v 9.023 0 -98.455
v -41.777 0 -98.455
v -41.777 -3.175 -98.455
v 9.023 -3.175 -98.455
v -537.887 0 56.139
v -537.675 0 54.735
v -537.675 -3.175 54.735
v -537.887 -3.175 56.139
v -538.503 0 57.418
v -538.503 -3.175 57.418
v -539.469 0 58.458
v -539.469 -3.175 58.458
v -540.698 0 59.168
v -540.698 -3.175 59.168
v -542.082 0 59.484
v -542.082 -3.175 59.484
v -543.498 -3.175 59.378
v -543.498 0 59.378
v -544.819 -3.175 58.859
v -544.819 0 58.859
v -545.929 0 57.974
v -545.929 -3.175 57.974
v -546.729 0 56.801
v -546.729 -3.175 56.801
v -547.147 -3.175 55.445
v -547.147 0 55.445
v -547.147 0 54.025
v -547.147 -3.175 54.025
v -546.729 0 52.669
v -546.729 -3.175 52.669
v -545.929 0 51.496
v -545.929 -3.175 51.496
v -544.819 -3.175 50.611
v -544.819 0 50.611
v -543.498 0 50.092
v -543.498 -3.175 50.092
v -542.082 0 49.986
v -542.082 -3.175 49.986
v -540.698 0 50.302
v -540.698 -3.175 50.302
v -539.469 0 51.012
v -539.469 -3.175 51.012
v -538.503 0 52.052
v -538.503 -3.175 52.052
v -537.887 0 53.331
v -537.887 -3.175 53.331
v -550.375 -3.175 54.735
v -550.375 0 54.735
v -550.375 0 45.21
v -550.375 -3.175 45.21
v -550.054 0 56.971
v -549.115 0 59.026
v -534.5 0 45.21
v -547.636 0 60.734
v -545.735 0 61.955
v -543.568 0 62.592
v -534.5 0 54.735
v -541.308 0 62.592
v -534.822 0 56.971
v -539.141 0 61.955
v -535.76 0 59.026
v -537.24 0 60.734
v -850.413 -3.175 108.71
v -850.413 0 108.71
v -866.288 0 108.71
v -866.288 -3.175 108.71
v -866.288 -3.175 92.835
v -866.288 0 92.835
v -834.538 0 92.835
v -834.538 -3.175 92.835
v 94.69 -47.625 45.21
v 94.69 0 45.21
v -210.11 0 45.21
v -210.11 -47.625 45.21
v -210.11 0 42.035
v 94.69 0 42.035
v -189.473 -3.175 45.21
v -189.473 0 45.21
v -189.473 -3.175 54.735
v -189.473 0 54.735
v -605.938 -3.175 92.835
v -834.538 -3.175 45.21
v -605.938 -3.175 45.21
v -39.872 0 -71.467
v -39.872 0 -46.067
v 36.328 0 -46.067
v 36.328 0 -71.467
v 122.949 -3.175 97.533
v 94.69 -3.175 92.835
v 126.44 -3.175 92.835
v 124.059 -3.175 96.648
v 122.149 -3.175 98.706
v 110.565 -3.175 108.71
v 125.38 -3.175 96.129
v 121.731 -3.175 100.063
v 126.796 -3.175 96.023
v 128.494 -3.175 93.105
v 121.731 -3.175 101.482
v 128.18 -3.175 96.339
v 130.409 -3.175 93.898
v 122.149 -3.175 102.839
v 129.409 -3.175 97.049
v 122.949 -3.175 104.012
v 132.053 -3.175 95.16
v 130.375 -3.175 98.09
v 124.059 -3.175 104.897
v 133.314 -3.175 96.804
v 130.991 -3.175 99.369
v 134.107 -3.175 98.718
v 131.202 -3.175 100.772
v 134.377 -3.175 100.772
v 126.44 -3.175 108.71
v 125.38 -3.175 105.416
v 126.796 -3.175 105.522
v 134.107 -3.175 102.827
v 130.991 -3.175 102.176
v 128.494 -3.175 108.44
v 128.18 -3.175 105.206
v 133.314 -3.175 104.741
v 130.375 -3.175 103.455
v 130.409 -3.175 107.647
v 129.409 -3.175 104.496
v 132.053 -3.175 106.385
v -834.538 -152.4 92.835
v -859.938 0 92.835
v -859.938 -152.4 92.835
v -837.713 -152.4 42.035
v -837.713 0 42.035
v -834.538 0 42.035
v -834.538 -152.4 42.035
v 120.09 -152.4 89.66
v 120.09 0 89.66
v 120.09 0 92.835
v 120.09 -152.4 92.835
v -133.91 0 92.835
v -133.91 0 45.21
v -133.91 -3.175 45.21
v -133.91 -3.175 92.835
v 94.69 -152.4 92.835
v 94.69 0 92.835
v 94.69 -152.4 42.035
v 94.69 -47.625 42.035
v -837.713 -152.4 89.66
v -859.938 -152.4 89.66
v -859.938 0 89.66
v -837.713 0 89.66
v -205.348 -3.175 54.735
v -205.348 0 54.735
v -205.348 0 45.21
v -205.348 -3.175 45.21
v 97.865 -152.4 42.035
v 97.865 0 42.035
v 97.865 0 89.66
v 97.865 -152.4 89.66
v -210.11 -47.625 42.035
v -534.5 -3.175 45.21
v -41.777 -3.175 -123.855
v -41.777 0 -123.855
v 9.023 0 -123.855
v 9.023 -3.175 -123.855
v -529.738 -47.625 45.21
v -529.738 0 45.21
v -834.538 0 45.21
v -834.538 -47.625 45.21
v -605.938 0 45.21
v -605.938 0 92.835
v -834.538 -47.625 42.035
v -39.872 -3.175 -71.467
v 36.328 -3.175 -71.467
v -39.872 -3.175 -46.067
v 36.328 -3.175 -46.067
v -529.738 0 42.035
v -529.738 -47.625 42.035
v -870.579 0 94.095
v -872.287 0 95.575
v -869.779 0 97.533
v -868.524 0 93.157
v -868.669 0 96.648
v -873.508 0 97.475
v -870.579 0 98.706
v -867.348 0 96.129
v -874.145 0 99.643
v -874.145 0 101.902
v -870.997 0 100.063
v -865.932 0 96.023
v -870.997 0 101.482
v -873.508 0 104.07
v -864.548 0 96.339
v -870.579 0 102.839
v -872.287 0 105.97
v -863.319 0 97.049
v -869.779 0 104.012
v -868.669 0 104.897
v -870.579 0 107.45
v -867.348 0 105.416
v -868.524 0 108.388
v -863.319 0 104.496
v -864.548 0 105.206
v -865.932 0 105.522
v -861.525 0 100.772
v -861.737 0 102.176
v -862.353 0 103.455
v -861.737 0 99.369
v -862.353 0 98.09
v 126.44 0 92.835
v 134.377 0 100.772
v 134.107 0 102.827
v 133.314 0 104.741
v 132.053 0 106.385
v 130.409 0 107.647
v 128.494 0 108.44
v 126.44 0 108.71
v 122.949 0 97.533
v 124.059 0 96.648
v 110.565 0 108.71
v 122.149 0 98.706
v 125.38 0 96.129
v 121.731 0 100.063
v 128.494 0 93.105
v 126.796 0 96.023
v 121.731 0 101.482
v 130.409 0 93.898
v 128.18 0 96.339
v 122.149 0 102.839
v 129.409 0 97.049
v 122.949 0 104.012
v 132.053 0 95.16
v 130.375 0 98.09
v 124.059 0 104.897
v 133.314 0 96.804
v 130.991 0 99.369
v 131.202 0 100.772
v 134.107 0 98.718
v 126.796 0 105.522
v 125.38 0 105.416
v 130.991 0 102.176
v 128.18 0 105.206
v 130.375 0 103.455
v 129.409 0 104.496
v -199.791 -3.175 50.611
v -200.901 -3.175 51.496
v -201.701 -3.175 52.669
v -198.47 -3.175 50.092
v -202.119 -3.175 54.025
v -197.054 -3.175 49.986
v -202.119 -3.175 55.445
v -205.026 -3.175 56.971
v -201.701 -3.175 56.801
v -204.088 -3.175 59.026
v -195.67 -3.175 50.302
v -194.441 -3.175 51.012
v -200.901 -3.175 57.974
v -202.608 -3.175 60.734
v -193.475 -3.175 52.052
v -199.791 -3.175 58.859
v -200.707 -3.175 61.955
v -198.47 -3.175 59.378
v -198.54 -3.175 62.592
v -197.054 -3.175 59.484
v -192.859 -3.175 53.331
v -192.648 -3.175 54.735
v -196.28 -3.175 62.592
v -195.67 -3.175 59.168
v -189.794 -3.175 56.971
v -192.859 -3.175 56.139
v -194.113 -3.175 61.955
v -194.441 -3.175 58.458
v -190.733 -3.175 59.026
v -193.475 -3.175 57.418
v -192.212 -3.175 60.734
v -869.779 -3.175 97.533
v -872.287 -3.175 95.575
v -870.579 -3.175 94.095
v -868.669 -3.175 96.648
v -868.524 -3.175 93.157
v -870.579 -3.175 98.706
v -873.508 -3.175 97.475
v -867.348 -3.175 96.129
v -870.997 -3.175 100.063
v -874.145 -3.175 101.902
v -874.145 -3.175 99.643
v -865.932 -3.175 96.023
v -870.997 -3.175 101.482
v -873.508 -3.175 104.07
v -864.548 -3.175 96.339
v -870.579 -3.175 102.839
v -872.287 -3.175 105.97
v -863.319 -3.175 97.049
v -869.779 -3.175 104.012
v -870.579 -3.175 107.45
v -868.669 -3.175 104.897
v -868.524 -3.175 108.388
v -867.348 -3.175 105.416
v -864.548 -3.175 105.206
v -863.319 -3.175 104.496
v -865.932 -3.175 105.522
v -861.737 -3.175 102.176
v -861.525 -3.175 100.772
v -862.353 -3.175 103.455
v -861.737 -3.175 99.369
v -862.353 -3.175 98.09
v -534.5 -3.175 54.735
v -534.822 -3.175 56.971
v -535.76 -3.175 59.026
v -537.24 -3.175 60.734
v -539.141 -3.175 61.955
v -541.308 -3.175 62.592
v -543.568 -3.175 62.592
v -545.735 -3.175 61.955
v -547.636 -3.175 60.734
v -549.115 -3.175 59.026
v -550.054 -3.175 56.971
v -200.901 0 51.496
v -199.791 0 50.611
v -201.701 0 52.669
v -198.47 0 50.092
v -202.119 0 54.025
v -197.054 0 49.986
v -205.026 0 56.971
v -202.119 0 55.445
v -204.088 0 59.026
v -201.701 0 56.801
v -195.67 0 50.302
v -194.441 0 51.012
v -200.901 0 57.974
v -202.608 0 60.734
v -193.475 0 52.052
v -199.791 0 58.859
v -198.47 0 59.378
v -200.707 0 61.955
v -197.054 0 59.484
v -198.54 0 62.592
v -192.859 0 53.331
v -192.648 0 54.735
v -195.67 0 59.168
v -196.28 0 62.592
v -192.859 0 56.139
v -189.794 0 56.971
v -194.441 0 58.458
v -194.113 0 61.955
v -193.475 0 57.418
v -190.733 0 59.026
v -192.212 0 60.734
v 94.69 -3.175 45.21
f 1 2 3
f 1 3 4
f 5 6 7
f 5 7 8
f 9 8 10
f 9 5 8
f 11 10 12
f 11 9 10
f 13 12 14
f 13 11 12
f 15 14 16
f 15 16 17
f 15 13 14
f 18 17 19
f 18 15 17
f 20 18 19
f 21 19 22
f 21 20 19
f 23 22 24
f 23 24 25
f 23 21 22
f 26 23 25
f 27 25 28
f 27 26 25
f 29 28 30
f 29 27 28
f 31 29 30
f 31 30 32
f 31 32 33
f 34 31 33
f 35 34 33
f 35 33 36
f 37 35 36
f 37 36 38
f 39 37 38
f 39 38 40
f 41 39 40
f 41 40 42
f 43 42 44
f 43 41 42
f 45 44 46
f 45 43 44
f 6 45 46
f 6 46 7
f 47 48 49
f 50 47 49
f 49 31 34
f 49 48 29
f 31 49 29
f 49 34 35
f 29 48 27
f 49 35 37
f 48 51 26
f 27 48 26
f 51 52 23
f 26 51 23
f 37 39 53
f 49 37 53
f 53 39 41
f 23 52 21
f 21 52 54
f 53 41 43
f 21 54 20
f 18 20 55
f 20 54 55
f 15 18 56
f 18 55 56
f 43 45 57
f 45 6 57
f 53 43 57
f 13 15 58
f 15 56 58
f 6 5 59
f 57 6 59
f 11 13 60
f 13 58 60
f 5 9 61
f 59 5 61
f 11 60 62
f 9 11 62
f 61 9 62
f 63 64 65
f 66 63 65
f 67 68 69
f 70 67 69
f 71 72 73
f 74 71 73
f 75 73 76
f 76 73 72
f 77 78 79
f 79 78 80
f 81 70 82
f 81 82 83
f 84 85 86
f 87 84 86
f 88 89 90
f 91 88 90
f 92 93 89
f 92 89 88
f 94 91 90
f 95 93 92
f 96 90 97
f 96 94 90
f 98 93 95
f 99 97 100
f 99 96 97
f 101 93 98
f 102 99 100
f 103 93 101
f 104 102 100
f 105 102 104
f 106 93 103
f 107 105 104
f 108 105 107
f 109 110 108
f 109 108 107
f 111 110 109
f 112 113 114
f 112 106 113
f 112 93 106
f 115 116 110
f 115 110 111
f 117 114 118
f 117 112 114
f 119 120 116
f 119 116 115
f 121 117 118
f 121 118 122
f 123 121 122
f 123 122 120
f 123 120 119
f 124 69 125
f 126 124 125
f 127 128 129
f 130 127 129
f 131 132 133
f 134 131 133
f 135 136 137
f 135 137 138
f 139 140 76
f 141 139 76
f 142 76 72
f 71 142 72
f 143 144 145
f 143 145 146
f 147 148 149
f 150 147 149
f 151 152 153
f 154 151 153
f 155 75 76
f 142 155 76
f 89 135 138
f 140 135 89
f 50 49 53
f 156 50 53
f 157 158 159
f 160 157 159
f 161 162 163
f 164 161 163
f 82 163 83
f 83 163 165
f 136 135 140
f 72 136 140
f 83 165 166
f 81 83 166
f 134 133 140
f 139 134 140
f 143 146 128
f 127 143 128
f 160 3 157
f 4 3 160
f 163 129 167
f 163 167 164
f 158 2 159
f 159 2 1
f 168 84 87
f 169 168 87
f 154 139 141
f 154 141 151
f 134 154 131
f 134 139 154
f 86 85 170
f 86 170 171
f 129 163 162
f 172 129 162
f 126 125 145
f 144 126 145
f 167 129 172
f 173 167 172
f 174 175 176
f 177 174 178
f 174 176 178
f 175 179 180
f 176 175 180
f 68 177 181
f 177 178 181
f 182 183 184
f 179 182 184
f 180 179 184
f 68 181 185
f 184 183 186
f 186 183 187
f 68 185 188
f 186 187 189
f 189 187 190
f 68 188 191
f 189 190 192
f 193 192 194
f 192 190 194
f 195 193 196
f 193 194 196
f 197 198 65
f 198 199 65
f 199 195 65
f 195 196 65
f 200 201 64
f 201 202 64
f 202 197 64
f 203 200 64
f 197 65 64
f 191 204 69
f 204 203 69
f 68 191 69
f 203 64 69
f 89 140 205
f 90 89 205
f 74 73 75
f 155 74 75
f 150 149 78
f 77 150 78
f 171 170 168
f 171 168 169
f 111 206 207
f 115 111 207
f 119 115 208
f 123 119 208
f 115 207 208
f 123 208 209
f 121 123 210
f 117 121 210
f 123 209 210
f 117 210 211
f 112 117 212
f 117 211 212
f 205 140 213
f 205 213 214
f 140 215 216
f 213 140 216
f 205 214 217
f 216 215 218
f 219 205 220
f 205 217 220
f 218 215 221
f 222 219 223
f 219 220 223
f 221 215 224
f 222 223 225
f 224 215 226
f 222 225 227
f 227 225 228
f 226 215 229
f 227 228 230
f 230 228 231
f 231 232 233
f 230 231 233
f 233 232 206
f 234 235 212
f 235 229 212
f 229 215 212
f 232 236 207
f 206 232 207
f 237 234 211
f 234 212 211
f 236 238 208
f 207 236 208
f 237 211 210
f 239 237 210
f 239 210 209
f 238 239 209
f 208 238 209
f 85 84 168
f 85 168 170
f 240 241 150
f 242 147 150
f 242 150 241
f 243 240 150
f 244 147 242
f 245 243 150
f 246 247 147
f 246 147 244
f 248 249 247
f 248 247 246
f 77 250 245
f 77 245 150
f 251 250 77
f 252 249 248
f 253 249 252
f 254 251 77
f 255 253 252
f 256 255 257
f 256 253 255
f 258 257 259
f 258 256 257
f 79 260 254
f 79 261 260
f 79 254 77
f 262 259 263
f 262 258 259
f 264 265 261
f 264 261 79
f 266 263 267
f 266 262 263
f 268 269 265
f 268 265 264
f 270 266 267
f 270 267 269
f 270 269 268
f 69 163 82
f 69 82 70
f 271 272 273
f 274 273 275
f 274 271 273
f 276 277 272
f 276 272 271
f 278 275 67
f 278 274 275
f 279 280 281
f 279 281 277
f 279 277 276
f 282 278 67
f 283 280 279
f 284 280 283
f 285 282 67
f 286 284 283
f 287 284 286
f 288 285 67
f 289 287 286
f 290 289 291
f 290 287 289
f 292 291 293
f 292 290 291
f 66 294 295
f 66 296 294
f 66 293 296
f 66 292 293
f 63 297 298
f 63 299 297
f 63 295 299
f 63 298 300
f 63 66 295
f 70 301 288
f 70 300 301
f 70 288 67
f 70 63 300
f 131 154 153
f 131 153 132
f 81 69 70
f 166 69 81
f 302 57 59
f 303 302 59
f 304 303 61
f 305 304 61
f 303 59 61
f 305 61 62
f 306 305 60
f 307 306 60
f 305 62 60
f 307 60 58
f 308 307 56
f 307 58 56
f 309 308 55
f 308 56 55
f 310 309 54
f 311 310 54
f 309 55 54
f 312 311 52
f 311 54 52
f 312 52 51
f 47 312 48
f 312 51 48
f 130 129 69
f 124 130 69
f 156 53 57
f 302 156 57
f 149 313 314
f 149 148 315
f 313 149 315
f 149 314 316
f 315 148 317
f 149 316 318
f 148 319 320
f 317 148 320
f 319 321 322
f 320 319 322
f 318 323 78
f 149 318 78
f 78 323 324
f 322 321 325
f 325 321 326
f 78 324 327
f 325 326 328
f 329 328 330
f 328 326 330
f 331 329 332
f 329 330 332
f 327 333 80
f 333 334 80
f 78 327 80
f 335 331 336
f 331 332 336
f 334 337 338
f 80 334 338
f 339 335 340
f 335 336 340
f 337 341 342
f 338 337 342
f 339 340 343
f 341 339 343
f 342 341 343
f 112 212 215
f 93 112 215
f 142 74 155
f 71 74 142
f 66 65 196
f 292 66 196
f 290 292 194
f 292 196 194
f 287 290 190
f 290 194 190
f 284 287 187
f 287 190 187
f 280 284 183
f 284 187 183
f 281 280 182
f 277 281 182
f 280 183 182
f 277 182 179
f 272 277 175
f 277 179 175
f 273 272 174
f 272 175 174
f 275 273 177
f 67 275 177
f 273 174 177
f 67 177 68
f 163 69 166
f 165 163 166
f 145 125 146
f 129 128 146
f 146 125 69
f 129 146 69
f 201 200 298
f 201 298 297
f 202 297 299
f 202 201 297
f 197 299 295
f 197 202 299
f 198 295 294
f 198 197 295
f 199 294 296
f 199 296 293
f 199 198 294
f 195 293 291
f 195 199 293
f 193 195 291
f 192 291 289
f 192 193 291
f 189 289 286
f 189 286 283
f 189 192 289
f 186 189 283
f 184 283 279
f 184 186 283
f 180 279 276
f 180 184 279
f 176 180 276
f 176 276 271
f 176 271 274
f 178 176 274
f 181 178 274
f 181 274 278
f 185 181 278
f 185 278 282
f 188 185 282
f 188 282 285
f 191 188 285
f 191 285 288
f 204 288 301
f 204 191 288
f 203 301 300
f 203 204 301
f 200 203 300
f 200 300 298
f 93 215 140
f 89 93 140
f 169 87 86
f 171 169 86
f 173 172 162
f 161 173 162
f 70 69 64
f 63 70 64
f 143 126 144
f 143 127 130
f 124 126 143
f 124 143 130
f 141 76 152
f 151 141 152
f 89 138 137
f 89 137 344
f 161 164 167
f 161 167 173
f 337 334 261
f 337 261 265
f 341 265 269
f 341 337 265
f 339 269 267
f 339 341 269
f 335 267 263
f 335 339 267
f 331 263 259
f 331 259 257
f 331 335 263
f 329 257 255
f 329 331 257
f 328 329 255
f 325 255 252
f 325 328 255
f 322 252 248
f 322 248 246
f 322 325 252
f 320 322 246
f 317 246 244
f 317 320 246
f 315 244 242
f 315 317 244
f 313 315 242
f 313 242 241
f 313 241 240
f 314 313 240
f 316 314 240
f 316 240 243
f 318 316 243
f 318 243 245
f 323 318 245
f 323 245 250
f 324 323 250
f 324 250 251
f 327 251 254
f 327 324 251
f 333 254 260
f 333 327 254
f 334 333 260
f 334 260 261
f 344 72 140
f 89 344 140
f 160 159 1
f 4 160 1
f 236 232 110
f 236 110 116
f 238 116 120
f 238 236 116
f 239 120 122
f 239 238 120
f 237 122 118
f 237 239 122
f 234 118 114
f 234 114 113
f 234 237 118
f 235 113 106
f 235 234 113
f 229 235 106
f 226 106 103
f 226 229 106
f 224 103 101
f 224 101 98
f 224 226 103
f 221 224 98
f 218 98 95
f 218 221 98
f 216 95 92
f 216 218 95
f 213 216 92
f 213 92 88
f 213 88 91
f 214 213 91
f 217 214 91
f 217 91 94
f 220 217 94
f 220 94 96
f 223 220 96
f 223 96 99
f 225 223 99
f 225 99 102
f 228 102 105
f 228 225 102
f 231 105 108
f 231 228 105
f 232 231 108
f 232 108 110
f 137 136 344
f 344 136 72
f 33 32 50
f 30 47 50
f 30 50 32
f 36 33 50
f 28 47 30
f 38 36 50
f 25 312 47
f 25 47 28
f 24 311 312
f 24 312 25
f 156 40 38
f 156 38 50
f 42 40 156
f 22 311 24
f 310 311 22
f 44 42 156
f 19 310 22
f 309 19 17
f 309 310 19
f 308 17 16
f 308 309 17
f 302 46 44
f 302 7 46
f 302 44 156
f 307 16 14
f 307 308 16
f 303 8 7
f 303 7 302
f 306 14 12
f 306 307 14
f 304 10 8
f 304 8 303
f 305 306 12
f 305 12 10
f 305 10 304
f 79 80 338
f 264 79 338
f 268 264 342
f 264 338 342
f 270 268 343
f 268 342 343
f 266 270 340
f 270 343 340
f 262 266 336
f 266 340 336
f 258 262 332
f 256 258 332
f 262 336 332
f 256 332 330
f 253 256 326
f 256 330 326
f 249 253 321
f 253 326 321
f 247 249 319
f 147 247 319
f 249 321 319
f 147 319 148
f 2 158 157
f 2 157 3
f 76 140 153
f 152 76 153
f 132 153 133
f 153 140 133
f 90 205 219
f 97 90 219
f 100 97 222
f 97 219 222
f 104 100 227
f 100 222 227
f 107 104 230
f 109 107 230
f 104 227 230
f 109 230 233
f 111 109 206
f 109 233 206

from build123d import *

# Parameters (mm, degrees)
F1_DEPTH = 152.4
F0_R     = 4.7625
F2_DEPTH = 3.175
F0_W     = 228.6
F0_H     = 3.175
F0_W_2   = 25.4
F3_DEPTH = 47.625
F0_H_2   = 47.625
F4_DEPTH = 3.175
F5_W     = 76.2
F5_H     = 25.4
F5_W_2   = 50.8
F6_DEPTH = 3.175


with BuildPart() as f1:
    # F0 (on Front) → F1 (new body)
    with BuildSketch(Plane.XZ):
        Polygon((-834.53792, 42.034976), (-834.53792, 45.209976), (-834.53792, 92.834976), (-859.93792, 92.834976), (-859.93792, 89.659976), (-837.71292, 89.659976), (-837.71292, 42.034976), align=None)
        Polygon((120.089924, 89.659976), (120.089924, 92.834976), (94.689924, 92.834976), (94.689924, 45.209976), (94.689924, 42.034976), (97.864924, 42.034976), (97.864924, 89.659976), align=None)
    extrude(amount=F1_DEPTH)


with BuildPart() as f2:
    # F0 (on Front) → F2 (new body)
    with BuildSketch(Plane.XZ):
        with BuildLine():
            ThreePointArc((-858.35042, 100.772476), (-860.67526, 106.385136), (-866.28792, 108.709976))
            ThreePointArc((-866.28792, 108.709976), (-874.22542, 100.772476), (-866.28792, 92.834976))
            ThreePointArc((-866.28792, 92.834976), (-860.67526, 95.159816), (-858.35042, 100.772476))
        make_face()
        with Locations((-866.28792, 100.772476)):
            Circle(F0_R, mode=Mode.SUBTRACT)
        with BuildLine():
            Line((-859.93792, 92.834976), (-834.53792, 92.834976))
            Line((-834.53792, 92.834976), (-850.41292, 108.709976))
            Line((-850.41292, 108.709976), (-866.28792, 108.709976))
            ThreePointArc((-866.28792, 108.709976), (-860.67526, 106.385136), (-858.35042, 100.772476))
            ThreePointArc((-858.35042, 100.772476), (-860.67526, 95.159816), (-866.28792, 92.834976))
            Line((-866.28792, 92.834976), (-859.93792, 92.834976))
        make_face()
        with BuildLine():
            Line((94.689924, 92.834976), (120.089924, 92.834976))
            Line((120.089924, 92.834976), (126.439924, 92.834976))
            ThreePointArc((126.439924, 92.834976), (118.502424, 100.772476), (126.439924, 108.709976))
            Line((126.439924, 108.709976), (110.564924, 108.709976))
            Line((110.564924, 108.709976), (94.689924, 92.834976))
        make_face()
        with BuildLine():
            ThreePointArc((126.439924, 108.709976), (118.502424, 100.772476), (126.439924, 92.834976))
            ThreePointArc((126.439924, 92.834976), (132.052584, 95.159816), (134.377424, 100.772476))
            ThreePointArc((134.377424, 100.772476), (132.052584, 106.385136), (126.439924, 108.709976))
        make_face()
        with Locations((126.439924, 100.772476)):
            Circle(F0_R, mode=Mode.SUBTRACT)
        with BuildLine():
            ThreePointArc((-534.50042, 54.734976), (-542.43792, 46.797476), (-550.37542, 54.734976))
            Line((-550.37542, 54.734976), (-550.37542, 45.209976))
            Line((-550.37542, 45.209976), (-534.50042, 45.209976))
            Line((-534.50042, 45.209976), (-534.50042, 54.734976))
        make_face()
        with BuildLine():
            ThreePointArc((-534.50042, 54.734976), (-542.43792, 62.672476), (-550.37542, 54.734976))
            ThreePointArc((-550.37542, 54.734976), (-542.43792, 46.797476), (-534.50042, 54.734976))
        make_face()
        with Locations((-542.43792, 54.734976)):
            Circle(F0_R, mode=Mode.SUBTRACT)
        with BuildLine():
            ThreePointArc((-205.347576, 54.734976), (-197.410076, 46.797476), (-189.472576, 54.734976))
            ThreePointArc((-189.472576, 54.734976), (-197.410076, 62.672476), (-205.347576, 54.734976))
        make_face()
        with Locations((-197.410076, 54.734976)):
            Circle(F0_R, mode=Mode.SUBTRACT)
        with BuildLine():
            Line((-205.347576, 45.209976), (-189.472576, 45.209976))
            Line((-189.472576, 45.209976), (-189.472576, 54.734976))
            ThreePointArc((-189.472576, 54.734976), (-197.410076, 46.797476), (-205.347576, 54.734976))
            Line((-205.347576, 54.734976), (-205.347576, 45.209976))
        make_face()
    extrude(amount=F2_DEPTH)


with BuildPart() as f3:
    # F0 (on Front) → F3 (new body)
    with BuildSketch(Plane.XZ):
        with Locations((-720.23792, 43.622476)):
            Rectangle(F0_W, F0_H)
        with Locations((-593.23792, 43.622476)):
            Rectangle(F0_W_2, F0_H)
        with Locations((-567.83792, 43.622476)):
            Rectangle(F0_W_2, F0_H)
        Polygon((-534.50042, 45.209976), (-550.37542, 45.209976), (-555.13792, 45.209976), (-555.13792, 42.034976), (-529.73792, 42.034976), (-529.73792, 45.209976), align=None)
        Polygon((-184.710076, 42.034976), (-184.710076, 45.209976), (-189.472576, 45.209976), (-205.347576, 45.209976), (-210.110076, 45.209976), (-210.110076, 42.034976), align=None)
        with Locations((-172.010076, 43.622476)):
            Rectangle(F0_W_2, F0_H)
        with Locations((-146.610076, 43.622476)):
            Rectangle(F0_W_2, F0_H)
        with Locations((-19.610076, 43.622476)):
            Rectangle(F0_W, F0_H)
    extrude(amount=F3_DEPTH)


with BuildPart() as f4:
    # F0 (on Front) → F4 (new body)
    with BuildSketch(Plane.XZ):
        with Locations((-720.23792, 69.022476)):
            Rectangle(F0_W, F0_H_2)
        with Locations((-19.610076, 69.022476)):
            Rectangle(F0_W, F0_H_2)
    extrude(amount=F4_DEPTH)


with BuildPart() as f6:
    # F5 (on Front) → F6 (new body)
    with BuildSketch(Plane.XZ):
        with Locations((-1.771966, -58.767139)):
            Rectangle(F5_W, F5_H)
        with Locations((-16.376971, -111.154639)):
            Rectangle(F5_W_2, F5_H)
    extrude(amount=F6_DEPTH)


solid = Compound([f1.part, f2.part, f3.part, f4.part, f6.part])
